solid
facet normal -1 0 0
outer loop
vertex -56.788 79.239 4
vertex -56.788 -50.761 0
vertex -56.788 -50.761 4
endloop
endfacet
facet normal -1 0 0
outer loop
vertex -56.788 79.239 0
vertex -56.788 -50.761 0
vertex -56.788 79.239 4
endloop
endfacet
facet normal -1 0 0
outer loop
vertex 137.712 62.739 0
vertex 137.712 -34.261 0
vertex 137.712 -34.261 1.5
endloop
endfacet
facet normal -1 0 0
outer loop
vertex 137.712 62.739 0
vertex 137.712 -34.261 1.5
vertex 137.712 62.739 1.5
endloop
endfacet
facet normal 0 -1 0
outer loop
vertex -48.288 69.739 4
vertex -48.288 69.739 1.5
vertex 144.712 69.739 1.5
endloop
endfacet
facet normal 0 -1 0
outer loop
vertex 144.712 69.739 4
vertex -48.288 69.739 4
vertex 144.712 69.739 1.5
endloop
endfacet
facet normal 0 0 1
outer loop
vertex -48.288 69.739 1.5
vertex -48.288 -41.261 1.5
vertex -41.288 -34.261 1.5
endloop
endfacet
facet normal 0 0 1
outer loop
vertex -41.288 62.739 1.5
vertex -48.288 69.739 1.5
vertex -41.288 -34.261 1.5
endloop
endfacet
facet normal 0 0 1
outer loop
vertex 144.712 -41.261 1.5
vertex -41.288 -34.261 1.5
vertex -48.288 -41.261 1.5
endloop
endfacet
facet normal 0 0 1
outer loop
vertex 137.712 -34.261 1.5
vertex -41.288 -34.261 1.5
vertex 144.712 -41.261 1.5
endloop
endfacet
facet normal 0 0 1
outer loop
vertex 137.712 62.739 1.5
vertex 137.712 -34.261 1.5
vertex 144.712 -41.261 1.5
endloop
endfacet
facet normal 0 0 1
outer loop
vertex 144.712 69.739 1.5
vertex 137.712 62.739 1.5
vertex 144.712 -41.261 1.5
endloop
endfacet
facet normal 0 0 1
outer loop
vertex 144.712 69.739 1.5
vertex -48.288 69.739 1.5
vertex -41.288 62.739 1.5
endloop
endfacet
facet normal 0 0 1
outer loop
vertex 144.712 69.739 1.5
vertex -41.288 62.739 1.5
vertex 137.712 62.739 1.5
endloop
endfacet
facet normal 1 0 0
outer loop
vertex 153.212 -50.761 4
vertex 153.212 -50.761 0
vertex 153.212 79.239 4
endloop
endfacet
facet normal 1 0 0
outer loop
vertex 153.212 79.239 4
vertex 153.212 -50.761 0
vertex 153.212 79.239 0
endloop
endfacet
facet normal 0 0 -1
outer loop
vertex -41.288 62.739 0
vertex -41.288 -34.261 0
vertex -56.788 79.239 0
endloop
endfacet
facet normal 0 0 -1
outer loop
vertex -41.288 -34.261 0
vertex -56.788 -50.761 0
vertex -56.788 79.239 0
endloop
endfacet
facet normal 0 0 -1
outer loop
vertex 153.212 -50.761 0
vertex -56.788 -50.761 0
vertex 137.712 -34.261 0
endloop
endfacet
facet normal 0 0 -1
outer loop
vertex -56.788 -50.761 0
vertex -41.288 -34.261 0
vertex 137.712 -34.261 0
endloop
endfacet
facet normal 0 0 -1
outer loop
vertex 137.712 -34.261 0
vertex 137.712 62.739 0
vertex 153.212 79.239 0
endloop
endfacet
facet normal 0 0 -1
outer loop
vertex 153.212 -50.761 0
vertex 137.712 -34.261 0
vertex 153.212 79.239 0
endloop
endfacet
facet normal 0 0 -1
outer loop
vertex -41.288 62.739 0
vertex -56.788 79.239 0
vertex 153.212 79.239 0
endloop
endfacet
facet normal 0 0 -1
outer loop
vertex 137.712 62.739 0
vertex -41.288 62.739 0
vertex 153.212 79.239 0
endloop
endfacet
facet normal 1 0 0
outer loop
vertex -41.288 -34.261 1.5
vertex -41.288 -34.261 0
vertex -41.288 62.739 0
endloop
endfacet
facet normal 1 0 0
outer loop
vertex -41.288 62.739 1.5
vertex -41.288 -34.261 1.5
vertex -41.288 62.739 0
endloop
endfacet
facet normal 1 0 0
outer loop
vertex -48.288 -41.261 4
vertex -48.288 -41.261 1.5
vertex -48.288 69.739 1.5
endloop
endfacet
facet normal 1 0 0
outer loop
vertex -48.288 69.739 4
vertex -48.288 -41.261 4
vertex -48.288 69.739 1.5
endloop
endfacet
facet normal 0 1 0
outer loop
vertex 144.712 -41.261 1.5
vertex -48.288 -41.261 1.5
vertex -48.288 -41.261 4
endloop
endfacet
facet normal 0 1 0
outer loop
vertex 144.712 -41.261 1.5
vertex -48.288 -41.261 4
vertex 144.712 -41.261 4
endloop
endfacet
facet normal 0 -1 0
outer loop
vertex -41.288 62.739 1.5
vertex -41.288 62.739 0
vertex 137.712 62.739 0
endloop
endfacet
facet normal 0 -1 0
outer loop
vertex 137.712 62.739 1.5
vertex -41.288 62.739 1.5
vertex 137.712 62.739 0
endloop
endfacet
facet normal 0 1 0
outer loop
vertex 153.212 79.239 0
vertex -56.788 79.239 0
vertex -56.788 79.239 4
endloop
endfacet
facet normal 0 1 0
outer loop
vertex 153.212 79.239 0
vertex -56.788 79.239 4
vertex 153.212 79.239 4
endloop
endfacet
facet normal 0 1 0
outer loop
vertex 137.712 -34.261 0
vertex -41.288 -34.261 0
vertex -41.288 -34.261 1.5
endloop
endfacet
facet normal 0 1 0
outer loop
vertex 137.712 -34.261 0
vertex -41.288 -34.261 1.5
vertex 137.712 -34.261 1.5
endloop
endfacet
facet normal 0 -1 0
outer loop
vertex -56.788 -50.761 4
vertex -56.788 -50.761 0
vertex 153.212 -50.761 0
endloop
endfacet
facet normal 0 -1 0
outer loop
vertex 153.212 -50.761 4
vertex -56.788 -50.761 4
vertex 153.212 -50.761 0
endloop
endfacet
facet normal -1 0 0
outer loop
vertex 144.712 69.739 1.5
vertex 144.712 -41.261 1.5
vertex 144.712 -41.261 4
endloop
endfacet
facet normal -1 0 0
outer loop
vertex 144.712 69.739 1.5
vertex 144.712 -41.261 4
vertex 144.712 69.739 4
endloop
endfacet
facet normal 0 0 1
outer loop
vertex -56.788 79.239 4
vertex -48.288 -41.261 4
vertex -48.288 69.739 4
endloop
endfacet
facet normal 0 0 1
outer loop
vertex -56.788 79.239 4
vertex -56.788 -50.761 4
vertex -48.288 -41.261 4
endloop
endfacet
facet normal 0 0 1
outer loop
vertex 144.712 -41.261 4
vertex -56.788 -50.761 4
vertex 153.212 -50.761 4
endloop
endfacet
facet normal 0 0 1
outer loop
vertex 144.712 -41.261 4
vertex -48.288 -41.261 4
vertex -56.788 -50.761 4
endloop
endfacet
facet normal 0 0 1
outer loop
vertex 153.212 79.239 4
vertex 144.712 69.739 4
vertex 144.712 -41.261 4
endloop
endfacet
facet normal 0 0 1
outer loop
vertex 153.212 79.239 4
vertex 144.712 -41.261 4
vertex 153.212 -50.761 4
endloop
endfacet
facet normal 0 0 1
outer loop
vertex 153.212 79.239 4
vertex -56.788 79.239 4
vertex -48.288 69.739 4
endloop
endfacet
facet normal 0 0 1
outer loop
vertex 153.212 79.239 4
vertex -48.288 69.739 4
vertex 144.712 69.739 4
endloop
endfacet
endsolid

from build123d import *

# Parameters (mm, degrees)
F0_W     = 210
F0_H     = 130
F0_W_2   = 193
F0_H_2   = 111
F1_DEPTH = 4
F0_W_3   = 179
F0_H_3   = 97
F2_DEPTH = 1.5


with BuildPart() as f1:
    # F0 (on Top) → F1 (new body)
    with BuildSketch(Plane.XY):
        with Locations((48.212263, 14.238792)):
            Rectangle(F0_W, F0_H)
        with Locations((48.212263, 14.238792)):
            Rectangle(F0_W_2, F0_H_2, mode=Mode.SUBTRACT)
    extrude(amount=F1_DEPTH)

    # F0 (on Top) → F2 (join)
    with BuildSketch(Plane.XY):
        with Locations((48.212263, 14.238792)):
            Rectangle(F0_W_2, F0_H_2)
        with Locations((48.212263, 14.238792)):
            Rectangle(F0_W_3, F0_H_3, mode=Mode.SUBTRACT)
    extrude(amount=F2_DEPTH)


solid = f1.part
